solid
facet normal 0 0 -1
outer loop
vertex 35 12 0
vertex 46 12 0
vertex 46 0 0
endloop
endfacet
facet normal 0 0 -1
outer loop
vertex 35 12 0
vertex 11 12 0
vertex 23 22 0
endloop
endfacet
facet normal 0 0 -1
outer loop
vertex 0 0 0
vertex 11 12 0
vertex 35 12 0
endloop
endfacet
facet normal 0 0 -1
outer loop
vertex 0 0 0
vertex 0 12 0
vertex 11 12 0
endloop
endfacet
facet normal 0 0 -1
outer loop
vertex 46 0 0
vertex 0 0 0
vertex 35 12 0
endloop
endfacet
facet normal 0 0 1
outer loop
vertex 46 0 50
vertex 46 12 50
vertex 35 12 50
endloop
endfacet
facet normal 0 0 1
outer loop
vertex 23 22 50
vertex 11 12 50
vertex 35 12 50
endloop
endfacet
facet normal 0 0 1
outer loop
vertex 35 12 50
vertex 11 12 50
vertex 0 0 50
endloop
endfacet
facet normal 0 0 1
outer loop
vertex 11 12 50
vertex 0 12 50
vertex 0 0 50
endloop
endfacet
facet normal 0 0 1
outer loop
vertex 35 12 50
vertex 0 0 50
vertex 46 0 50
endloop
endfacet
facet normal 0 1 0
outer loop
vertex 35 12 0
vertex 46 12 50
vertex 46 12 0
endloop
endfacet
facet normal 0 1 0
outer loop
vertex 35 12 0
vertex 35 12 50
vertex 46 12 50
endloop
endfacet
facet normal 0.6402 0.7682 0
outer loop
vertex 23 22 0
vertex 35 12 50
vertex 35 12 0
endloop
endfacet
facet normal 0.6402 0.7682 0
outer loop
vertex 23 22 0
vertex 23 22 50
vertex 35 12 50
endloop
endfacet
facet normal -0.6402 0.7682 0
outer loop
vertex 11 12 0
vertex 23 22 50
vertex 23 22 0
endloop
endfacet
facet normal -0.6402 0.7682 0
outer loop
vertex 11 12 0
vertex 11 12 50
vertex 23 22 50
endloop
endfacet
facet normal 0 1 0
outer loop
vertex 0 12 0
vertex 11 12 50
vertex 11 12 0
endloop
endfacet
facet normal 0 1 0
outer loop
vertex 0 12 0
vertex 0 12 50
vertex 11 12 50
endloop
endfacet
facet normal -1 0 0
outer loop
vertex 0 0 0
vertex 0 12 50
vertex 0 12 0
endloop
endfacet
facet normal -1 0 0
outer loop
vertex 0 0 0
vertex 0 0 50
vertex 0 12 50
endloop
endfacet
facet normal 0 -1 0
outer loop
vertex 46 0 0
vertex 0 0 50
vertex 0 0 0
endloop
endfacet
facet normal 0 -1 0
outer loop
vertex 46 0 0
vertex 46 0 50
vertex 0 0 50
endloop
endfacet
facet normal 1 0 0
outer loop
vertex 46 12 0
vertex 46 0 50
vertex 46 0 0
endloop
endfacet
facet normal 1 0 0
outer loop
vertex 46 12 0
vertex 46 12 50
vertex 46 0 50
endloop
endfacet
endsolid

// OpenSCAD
$fn = 32;

// ----------------------------------------------------------------------
// V guide rail: vrib, 46 mm wide
// ----------------------------------------------------------------------

// --- parameters (mm) ---
rail_w = 46;              // rail width, X
base_t = 12;              // base plate thickness
v_depth = 10;             // V feature depth / height
v_half_w = 12;            // half width of the V at the base face
plate_t = 50;             // rail length, Z (the extrusion height)
fit_tol = 0.05;           // declared fit tolerance (prompt contract)
free_tol = 0.2;           // declared free tolerance (prompt contract)

profile = [[0, 0], [46, 0], [46, 12], [35, 12], [23, 22], [11, 12], [0, 12]];  // primary outline, 7 points, counter clockwise

// --- the one profile operation ---
linear_extrude(height = plate_t) polygon(points = profile);
